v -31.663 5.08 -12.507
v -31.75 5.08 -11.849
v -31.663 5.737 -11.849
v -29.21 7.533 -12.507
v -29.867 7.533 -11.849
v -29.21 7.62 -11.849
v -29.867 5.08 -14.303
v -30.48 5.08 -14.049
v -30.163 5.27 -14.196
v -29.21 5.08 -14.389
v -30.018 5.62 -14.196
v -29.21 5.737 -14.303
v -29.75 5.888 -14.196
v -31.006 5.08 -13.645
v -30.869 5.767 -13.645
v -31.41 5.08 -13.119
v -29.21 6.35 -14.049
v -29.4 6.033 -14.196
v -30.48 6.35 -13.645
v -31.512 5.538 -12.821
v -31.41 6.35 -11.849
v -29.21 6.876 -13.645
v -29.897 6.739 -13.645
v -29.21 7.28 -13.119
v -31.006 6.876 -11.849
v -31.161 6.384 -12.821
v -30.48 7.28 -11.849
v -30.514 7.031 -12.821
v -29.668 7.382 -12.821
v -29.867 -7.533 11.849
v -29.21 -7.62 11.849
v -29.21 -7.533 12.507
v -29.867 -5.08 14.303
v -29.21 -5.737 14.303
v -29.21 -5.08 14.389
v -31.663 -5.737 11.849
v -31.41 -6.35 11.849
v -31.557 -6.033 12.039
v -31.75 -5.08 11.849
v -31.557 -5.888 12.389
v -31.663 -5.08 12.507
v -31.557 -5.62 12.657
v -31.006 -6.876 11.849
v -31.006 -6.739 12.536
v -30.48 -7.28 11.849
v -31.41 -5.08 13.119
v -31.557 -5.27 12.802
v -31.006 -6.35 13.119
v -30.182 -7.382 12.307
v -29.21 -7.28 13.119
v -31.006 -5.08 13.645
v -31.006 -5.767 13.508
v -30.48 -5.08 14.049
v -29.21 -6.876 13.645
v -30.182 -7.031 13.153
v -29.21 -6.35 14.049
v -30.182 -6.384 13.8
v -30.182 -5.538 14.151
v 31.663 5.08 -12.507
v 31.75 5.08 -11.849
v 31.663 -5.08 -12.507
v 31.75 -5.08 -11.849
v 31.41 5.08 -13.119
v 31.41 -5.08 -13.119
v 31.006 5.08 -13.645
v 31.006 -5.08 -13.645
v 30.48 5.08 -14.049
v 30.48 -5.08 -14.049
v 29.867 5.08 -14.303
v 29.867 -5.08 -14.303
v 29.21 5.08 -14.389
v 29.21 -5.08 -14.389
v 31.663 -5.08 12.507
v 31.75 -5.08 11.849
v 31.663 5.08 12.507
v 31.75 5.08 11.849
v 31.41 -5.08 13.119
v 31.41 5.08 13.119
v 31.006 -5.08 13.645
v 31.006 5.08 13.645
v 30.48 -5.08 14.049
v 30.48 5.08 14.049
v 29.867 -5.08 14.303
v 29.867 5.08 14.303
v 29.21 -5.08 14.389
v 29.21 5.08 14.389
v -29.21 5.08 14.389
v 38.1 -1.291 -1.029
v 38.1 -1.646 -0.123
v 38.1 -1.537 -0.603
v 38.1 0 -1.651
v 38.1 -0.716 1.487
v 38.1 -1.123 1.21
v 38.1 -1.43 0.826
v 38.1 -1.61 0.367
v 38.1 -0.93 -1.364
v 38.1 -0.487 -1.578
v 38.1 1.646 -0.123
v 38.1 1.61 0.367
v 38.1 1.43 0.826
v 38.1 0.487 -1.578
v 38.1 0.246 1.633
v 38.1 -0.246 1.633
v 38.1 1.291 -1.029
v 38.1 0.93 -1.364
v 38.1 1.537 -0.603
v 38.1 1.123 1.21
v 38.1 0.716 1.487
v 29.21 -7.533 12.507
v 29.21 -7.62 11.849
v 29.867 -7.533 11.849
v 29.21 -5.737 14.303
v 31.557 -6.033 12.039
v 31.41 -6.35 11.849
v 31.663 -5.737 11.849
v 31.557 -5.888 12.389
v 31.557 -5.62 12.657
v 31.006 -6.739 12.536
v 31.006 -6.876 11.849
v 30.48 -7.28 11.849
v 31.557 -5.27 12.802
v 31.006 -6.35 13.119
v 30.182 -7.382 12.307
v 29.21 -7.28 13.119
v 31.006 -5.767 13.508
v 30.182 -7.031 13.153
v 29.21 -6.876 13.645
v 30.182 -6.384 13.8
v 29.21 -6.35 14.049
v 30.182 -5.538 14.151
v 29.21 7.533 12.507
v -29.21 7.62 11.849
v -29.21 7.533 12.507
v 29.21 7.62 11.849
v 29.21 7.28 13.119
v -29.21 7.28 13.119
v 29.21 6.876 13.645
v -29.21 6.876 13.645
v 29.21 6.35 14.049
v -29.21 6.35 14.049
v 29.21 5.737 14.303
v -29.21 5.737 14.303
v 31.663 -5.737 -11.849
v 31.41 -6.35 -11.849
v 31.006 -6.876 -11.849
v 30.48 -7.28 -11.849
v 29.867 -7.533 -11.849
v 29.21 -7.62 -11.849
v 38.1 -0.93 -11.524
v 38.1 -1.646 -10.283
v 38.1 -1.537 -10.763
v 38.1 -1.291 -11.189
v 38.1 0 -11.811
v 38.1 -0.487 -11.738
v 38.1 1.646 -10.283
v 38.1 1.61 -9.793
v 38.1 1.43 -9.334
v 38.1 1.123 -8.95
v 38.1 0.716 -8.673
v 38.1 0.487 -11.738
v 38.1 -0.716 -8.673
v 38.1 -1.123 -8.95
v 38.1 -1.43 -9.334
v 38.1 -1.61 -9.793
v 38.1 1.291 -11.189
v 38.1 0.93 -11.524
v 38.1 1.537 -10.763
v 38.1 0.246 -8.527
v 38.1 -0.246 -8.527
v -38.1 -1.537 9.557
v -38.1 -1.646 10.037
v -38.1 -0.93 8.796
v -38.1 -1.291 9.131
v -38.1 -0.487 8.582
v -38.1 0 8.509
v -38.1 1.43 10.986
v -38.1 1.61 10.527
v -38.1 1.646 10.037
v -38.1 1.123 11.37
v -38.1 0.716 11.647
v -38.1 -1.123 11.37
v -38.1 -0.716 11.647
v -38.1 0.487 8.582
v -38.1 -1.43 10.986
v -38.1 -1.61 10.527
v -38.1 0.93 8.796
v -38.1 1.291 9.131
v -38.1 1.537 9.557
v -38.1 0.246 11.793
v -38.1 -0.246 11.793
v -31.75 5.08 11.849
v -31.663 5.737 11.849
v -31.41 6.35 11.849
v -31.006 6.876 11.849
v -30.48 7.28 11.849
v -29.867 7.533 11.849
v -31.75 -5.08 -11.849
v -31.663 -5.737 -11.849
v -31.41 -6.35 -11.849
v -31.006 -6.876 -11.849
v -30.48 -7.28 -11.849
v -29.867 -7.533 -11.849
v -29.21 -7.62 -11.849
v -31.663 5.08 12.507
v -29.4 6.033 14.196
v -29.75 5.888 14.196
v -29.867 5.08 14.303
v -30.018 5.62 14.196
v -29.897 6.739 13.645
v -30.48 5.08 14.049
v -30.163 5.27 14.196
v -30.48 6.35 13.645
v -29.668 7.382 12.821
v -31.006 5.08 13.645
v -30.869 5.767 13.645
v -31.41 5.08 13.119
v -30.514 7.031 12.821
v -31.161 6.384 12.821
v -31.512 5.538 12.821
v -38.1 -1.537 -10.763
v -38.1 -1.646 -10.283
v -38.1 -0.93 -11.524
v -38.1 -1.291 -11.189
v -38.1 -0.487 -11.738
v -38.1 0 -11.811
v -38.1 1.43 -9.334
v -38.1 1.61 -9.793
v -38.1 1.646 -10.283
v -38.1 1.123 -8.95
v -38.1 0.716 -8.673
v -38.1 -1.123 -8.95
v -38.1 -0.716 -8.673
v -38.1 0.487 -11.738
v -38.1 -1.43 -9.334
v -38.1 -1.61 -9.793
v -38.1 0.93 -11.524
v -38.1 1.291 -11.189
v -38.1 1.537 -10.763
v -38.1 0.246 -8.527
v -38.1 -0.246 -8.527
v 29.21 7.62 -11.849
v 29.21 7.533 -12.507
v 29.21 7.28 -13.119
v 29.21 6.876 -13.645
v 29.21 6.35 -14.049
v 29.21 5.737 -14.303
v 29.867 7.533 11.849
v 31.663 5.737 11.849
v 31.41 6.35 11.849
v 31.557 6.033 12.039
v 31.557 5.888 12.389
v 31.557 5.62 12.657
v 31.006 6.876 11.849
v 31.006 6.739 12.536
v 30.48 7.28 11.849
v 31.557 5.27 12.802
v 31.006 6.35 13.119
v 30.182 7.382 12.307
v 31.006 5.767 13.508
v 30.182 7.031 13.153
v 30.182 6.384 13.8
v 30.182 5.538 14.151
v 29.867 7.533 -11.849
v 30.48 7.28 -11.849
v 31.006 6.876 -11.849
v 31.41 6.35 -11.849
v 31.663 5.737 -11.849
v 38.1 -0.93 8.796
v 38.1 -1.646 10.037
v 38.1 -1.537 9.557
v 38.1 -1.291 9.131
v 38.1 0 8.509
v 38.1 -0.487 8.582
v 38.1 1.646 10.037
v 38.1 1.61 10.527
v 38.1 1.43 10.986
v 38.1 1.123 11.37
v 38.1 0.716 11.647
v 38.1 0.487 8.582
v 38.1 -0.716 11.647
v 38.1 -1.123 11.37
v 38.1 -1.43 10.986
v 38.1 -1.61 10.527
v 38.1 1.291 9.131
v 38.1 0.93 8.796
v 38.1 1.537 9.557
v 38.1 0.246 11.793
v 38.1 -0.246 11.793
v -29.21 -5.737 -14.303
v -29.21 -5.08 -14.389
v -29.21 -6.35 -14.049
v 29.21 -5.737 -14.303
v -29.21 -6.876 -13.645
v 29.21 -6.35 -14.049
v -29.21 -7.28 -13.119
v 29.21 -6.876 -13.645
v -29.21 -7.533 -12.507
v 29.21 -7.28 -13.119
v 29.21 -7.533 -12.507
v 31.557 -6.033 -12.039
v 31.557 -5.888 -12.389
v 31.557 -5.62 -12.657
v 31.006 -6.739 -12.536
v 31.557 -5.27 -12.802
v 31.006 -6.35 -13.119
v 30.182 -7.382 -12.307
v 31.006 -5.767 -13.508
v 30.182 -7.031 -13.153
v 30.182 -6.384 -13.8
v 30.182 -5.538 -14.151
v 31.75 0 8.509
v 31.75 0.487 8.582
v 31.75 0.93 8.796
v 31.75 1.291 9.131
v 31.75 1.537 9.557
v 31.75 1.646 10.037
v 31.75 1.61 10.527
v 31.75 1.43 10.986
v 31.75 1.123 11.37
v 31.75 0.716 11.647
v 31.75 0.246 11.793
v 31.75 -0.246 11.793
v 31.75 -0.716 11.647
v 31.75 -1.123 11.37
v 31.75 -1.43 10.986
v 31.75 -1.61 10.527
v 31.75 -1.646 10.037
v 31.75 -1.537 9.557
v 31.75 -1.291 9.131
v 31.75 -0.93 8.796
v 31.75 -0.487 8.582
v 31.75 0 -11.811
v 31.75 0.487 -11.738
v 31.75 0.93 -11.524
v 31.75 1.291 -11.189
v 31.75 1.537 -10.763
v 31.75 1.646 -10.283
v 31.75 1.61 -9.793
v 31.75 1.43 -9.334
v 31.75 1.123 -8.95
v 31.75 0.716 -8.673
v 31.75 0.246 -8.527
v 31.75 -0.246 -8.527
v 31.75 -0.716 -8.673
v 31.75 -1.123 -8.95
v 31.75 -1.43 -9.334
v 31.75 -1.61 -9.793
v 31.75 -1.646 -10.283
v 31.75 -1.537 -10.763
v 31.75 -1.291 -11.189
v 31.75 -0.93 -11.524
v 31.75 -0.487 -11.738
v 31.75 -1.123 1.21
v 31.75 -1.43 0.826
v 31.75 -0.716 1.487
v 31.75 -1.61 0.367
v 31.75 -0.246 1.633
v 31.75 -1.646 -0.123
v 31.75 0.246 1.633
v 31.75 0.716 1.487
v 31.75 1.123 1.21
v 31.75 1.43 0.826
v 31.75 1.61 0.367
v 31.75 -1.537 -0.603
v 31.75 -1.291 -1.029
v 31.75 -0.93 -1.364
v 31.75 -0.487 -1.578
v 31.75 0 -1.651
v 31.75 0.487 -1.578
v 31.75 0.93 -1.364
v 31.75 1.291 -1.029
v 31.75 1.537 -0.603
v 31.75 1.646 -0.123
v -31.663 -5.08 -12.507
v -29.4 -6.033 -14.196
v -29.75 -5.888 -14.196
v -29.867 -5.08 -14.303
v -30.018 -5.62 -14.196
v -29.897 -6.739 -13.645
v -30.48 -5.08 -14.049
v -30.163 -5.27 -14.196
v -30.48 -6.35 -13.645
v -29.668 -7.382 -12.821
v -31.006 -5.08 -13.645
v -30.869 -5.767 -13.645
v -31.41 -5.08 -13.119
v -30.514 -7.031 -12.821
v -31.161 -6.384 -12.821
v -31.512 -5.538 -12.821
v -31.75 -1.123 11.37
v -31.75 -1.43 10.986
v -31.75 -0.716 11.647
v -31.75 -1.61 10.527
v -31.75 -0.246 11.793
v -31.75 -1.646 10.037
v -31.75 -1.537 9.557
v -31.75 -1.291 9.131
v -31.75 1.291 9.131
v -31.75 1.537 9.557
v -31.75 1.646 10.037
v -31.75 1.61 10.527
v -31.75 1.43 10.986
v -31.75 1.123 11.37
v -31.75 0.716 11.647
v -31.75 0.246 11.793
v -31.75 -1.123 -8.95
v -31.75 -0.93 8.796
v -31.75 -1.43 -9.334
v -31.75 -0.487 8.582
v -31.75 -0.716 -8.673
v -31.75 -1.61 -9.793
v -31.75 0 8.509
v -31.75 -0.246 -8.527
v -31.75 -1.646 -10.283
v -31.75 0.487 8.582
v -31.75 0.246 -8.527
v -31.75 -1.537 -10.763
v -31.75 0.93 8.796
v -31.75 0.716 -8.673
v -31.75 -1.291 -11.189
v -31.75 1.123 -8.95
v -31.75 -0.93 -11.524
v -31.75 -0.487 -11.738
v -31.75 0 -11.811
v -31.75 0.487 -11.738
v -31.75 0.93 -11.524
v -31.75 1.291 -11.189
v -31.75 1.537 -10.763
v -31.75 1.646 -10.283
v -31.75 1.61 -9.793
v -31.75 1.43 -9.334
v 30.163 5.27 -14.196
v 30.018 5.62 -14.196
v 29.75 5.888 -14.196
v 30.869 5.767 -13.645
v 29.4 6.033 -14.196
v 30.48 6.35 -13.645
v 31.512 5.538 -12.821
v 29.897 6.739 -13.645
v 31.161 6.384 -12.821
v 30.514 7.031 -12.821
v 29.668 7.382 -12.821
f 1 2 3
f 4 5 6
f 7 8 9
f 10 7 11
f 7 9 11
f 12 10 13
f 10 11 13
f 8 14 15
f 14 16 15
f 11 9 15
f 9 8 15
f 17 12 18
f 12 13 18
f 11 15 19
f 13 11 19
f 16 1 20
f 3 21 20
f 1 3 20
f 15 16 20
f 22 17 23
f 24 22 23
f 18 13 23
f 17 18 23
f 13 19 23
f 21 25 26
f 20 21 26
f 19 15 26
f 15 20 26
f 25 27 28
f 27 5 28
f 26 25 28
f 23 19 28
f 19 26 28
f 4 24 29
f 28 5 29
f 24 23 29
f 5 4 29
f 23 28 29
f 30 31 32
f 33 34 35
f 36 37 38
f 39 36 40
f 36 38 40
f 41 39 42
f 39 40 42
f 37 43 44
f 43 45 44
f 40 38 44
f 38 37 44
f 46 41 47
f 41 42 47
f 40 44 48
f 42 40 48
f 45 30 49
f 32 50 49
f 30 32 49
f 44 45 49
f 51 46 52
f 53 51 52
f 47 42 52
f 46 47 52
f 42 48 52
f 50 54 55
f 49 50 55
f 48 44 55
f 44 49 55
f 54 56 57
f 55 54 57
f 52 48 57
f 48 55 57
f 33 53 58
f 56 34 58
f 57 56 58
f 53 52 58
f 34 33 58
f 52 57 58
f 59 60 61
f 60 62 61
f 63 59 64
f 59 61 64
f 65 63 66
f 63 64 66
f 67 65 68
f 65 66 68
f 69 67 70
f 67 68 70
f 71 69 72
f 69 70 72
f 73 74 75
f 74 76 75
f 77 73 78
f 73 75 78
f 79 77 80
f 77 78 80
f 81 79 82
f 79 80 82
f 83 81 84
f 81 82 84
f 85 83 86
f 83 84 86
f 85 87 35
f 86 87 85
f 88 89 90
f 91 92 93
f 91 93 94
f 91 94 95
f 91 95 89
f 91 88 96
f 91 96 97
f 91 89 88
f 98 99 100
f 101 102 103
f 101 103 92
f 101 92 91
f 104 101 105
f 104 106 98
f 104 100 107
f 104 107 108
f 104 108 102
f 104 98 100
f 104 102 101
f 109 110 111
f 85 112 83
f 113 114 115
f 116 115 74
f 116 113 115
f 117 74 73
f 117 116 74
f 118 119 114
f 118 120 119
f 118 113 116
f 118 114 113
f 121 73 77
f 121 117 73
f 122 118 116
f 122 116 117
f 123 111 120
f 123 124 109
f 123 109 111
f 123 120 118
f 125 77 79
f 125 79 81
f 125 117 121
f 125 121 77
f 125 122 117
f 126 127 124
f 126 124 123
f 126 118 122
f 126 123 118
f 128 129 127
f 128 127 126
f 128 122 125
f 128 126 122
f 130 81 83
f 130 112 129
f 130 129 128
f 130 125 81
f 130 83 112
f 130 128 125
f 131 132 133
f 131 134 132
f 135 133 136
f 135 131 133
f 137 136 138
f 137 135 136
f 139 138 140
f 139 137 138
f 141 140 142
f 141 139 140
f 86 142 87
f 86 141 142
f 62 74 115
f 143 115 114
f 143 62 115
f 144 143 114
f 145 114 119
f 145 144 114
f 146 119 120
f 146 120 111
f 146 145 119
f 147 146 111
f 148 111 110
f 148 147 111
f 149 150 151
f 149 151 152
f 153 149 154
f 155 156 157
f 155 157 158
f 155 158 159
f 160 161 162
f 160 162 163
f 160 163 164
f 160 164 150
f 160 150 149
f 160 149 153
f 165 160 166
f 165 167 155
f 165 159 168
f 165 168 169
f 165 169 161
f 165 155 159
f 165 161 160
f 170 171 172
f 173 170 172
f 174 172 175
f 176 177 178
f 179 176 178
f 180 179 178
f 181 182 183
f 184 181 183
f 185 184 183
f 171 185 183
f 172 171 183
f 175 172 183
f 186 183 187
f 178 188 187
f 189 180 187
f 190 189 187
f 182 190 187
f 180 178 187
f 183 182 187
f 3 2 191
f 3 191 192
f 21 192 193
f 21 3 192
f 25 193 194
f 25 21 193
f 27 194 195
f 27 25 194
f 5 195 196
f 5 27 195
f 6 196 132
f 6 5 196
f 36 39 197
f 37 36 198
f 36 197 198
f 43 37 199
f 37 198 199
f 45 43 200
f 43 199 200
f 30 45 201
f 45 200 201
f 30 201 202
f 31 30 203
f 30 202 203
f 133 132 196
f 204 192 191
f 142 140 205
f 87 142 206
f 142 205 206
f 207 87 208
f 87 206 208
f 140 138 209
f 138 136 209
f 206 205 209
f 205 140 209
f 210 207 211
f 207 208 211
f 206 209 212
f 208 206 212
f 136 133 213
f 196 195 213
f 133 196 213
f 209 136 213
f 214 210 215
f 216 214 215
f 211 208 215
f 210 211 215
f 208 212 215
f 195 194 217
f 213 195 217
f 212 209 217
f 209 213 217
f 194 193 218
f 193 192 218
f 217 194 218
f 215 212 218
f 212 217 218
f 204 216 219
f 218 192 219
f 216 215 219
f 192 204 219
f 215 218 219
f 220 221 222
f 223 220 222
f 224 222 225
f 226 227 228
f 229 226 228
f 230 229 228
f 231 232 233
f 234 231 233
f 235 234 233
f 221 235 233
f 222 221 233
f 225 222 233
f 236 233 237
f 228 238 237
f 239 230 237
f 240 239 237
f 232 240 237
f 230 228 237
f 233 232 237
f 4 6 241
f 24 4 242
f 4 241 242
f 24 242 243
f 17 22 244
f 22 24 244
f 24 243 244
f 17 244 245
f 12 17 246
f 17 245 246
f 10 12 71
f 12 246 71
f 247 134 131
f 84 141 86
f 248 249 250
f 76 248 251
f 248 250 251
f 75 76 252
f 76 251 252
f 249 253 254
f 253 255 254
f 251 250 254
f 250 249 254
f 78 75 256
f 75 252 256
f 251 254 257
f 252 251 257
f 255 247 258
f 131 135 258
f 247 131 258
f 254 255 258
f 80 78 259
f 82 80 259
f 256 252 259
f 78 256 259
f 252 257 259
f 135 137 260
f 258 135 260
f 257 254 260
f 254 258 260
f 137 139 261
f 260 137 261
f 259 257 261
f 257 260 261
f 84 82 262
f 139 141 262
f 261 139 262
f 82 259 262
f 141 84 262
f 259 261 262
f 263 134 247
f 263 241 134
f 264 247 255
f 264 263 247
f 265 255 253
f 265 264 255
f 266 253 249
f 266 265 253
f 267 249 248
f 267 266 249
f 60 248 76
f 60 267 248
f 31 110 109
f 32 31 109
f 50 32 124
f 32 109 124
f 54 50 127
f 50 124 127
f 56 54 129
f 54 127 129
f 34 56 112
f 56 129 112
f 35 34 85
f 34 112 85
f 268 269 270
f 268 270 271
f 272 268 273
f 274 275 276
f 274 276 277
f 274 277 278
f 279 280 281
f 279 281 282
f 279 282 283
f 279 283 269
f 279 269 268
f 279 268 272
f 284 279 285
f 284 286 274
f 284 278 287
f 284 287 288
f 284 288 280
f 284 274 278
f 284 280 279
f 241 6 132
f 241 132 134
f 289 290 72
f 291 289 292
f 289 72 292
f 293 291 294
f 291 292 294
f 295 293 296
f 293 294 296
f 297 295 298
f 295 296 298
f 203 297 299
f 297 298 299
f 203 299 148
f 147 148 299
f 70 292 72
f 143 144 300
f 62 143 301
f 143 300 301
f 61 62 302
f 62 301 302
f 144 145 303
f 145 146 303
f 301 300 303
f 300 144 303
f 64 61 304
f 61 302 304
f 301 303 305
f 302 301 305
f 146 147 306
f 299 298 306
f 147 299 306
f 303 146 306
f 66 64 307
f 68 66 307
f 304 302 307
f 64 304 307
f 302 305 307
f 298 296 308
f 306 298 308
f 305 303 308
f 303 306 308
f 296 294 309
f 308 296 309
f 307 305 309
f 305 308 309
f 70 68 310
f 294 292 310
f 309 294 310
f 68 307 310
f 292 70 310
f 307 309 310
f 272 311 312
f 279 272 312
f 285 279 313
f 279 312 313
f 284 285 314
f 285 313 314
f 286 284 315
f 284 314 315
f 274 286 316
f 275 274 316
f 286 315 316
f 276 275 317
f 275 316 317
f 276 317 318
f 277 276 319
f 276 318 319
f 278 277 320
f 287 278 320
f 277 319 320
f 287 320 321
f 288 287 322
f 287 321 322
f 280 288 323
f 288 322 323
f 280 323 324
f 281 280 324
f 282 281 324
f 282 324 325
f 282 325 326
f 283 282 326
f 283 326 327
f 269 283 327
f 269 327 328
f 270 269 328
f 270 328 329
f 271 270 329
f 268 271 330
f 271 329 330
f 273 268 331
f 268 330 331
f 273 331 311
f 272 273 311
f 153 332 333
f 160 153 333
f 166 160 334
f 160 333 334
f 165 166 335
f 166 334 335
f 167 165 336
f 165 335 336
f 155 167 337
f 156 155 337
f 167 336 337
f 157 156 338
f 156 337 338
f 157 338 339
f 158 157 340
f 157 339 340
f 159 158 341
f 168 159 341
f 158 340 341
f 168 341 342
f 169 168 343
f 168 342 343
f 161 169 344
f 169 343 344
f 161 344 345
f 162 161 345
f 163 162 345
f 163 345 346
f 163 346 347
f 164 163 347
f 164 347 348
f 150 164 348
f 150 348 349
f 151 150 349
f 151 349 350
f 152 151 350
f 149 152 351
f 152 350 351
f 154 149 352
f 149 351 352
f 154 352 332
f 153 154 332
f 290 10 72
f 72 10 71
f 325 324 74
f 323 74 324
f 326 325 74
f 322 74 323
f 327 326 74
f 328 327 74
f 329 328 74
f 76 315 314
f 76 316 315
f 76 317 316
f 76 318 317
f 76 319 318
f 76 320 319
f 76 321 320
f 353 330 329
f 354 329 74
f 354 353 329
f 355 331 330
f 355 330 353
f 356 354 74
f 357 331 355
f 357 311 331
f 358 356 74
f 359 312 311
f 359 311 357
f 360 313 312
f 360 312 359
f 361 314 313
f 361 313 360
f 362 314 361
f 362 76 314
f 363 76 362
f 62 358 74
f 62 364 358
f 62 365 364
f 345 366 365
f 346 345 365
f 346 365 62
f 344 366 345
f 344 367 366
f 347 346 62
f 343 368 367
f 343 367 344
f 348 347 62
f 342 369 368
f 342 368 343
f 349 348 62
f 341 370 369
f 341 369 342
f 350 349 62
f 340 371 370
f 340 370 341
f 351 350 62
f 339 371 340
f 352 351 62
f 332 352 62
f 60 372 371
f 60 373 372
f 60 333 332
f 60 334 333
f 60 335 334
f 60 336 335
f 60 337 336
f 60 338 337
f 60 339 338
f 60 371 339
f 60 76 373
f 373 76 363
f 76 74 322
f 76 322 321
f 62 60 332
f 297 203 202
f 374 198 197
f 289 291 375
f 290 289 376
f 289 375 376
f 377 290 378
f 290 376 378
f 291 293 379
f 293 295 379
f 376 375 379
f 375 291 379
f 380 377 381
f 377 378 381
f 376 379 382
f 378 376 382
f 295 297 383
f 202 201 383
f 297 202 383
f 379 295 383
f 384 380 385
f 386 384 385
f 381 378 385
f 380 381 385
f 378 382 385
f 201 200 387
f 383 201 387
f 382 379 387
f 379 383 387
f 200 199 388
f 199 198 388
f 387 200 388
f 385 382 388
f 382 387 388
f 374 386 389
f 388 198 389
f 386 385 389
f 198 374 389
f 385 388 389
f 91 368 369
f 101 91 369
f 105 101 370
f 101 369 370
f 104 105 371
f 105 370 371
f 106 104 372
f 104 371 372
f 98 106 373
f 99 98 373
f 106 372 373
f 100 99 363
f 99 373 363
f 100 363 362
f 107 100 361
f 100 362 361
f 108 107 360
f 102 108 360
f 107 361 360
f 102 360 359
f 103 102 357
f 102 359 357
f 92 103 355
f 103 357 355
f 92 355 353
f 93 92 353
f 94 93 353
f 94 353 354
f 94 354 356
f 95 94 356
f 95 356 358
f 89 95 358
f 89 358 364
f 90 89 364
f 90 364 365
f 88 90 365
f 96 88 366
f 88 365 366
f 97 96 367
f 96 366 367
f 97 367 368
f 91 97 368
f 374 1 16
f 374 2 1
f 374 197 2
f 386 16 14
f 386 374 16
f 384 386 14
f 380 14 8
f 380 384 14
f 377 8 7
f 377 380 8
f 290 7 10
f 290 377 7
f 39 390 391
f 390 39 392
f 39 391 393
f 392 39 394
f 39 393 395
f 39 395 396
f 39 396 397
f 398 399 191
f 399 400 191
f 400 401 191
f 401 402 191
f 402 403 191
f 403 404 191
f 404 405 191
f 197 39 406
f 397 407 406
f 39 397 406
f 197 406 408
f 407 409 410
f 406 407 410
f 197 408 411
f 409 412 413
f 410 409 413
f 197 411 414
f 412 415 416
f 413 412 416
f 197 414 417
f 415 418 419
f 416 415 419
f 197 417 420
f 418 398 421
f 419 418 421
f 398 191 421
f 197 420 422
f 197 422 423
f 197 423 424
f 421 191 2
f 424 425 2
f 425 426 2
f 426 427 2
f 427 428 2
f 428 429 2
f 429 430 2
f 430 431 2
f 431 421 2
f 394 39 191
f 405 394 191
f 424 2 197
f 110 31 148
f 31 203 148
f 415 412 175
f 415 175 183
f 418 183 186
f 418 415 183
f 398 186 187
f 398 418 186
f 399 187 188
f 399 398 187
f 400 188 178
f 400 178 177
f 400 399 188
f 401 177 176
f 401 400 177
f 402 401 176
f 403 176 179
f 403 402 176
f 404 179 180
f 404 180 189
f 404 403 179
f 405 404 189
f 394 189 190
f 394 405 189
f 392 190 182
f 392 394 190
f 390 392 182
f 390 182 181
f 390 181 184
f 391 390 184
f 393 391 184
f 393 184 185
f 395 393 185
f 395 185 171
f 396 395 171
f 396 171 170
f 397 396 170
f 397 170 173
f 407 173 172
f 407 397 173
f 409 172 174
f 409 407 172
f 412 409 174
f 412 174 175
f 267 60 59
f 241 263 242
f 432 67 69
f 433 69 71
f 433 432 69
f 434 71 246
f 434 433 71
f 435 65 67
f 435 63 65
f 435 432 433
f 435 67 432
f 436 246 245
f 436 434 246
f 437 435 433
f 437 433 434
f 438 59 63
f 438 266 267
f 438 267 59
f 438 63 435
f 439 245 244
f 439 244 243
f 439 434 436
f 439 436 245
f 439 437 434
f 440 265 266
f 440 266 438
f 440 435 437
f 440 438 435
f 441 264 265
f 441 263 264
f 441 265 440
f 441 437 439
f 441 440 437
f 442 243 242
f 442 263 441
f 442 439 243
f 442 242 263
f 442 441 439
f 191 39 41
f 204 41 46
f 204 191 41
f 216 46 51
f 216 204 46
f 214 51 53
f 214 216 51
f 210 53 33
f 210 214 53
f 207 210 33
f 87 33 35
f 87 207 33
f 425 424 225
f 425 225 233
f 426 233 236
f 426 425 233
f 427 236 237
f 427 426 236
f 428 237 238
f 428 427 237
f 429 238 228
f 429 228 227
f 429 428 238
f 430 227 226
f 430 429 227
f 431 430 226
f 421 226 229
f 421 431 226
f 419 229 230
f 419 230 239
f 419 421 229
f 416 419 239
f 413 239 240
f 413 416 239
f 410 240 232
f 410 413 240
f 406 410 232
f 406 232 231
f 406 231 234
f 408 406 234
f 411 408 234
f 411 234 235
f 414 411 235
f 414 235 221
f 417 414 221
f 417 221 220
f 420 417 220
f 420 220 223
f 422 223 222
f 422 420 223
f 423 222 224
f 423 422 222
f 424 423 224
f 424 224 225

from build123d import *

# Parameters (mm, degrees)
SKETCH1_W           = 63.5
SKETCH1_H           = 28.7782
BOSS_EXTRUDE1_DEPTH = 7.62
FILLET1_R           = 2.54
BOSS_EXTRUDE2_START = 31.75
SKETCH2_R           = 1.651
BOSS_EXTRUDE2_DEPTH = 6.35
BOSS_EXTRUDE3_START = -31.75
SKETCH2_2_R         = 1.651
BOSS_EXTRUDE3_DEPTH = 6.35


with BuildPart() as part:
    # Sketch1 → Boss-Extrude1 (new body, symmetric)
    with BuildSketch(Plane(origin=(0, 0, 0), x_dir=(1, 0, 0), z_dir=(0, 1, 0))):
        Rectangle(SKETCH1_W, SKETCH1_H)
    extrude(amount=BOSS_EXTRUDE1_DEPTH, both=True)

    # Fillet1
    fillet1_edges = [part.edges().sort_by_distance(p)[0] for p in [
        (-31.75, 7.62, 0),
        (0, 7.62, 14.3891),
        (31.75, 7.62, 0),
        (0, -7.62, 14.3891),
        (-31.75, -7.62, 0),
        (0, -7.62, -14.3891),
        (31.75, -7.62, 0),
        (31.75, 0, 14.3891),
        (-31.75, 0, 14.3891),
        (-31.75, 0, -14.3891),
        (31.75, 0, -14.3891),
        (0, 7.62, -14.3891),
    ]]
    fillet(fillet1_edges, radius=FILLET1_R)

    # Sketch2 → Boss-Extrude2 (add)
    with BuildSketch(Plane(origin=(0, 0, 0), x_dir=(0, 0, -1), z_dir=(1, 0, 0)).offset(BOSS_EXTRUDE2_START)):
        Circle(SKETCH2_R)
        with Locations((10.16, 0)):
            Circle(SKETCH2_R)
        with Locations((-10.16, 0)):
            Circle(SKETCH2_R)
    extrude(amount=BOSS_EXTRUDE2_DEPTH)

    # Sketch2<2> → Boss-Extrude3 (add)
    with BuildSketch(Plane(origin=(0, 0, 0), x_dir=(0, 0, -1), z_dir=(1, 0, 0)).offset(BOSS_EXTRUDE3_START)):
        with Locations((10.16, 0)):
            Circle(SKETCH2_2_R)
        with Locations((-10.16, 0)):
            Circle(SKETCH2_2_R)
    extrude(amount=-BOSS_EXTRUDE3_DEPTH)


solid = part.part
